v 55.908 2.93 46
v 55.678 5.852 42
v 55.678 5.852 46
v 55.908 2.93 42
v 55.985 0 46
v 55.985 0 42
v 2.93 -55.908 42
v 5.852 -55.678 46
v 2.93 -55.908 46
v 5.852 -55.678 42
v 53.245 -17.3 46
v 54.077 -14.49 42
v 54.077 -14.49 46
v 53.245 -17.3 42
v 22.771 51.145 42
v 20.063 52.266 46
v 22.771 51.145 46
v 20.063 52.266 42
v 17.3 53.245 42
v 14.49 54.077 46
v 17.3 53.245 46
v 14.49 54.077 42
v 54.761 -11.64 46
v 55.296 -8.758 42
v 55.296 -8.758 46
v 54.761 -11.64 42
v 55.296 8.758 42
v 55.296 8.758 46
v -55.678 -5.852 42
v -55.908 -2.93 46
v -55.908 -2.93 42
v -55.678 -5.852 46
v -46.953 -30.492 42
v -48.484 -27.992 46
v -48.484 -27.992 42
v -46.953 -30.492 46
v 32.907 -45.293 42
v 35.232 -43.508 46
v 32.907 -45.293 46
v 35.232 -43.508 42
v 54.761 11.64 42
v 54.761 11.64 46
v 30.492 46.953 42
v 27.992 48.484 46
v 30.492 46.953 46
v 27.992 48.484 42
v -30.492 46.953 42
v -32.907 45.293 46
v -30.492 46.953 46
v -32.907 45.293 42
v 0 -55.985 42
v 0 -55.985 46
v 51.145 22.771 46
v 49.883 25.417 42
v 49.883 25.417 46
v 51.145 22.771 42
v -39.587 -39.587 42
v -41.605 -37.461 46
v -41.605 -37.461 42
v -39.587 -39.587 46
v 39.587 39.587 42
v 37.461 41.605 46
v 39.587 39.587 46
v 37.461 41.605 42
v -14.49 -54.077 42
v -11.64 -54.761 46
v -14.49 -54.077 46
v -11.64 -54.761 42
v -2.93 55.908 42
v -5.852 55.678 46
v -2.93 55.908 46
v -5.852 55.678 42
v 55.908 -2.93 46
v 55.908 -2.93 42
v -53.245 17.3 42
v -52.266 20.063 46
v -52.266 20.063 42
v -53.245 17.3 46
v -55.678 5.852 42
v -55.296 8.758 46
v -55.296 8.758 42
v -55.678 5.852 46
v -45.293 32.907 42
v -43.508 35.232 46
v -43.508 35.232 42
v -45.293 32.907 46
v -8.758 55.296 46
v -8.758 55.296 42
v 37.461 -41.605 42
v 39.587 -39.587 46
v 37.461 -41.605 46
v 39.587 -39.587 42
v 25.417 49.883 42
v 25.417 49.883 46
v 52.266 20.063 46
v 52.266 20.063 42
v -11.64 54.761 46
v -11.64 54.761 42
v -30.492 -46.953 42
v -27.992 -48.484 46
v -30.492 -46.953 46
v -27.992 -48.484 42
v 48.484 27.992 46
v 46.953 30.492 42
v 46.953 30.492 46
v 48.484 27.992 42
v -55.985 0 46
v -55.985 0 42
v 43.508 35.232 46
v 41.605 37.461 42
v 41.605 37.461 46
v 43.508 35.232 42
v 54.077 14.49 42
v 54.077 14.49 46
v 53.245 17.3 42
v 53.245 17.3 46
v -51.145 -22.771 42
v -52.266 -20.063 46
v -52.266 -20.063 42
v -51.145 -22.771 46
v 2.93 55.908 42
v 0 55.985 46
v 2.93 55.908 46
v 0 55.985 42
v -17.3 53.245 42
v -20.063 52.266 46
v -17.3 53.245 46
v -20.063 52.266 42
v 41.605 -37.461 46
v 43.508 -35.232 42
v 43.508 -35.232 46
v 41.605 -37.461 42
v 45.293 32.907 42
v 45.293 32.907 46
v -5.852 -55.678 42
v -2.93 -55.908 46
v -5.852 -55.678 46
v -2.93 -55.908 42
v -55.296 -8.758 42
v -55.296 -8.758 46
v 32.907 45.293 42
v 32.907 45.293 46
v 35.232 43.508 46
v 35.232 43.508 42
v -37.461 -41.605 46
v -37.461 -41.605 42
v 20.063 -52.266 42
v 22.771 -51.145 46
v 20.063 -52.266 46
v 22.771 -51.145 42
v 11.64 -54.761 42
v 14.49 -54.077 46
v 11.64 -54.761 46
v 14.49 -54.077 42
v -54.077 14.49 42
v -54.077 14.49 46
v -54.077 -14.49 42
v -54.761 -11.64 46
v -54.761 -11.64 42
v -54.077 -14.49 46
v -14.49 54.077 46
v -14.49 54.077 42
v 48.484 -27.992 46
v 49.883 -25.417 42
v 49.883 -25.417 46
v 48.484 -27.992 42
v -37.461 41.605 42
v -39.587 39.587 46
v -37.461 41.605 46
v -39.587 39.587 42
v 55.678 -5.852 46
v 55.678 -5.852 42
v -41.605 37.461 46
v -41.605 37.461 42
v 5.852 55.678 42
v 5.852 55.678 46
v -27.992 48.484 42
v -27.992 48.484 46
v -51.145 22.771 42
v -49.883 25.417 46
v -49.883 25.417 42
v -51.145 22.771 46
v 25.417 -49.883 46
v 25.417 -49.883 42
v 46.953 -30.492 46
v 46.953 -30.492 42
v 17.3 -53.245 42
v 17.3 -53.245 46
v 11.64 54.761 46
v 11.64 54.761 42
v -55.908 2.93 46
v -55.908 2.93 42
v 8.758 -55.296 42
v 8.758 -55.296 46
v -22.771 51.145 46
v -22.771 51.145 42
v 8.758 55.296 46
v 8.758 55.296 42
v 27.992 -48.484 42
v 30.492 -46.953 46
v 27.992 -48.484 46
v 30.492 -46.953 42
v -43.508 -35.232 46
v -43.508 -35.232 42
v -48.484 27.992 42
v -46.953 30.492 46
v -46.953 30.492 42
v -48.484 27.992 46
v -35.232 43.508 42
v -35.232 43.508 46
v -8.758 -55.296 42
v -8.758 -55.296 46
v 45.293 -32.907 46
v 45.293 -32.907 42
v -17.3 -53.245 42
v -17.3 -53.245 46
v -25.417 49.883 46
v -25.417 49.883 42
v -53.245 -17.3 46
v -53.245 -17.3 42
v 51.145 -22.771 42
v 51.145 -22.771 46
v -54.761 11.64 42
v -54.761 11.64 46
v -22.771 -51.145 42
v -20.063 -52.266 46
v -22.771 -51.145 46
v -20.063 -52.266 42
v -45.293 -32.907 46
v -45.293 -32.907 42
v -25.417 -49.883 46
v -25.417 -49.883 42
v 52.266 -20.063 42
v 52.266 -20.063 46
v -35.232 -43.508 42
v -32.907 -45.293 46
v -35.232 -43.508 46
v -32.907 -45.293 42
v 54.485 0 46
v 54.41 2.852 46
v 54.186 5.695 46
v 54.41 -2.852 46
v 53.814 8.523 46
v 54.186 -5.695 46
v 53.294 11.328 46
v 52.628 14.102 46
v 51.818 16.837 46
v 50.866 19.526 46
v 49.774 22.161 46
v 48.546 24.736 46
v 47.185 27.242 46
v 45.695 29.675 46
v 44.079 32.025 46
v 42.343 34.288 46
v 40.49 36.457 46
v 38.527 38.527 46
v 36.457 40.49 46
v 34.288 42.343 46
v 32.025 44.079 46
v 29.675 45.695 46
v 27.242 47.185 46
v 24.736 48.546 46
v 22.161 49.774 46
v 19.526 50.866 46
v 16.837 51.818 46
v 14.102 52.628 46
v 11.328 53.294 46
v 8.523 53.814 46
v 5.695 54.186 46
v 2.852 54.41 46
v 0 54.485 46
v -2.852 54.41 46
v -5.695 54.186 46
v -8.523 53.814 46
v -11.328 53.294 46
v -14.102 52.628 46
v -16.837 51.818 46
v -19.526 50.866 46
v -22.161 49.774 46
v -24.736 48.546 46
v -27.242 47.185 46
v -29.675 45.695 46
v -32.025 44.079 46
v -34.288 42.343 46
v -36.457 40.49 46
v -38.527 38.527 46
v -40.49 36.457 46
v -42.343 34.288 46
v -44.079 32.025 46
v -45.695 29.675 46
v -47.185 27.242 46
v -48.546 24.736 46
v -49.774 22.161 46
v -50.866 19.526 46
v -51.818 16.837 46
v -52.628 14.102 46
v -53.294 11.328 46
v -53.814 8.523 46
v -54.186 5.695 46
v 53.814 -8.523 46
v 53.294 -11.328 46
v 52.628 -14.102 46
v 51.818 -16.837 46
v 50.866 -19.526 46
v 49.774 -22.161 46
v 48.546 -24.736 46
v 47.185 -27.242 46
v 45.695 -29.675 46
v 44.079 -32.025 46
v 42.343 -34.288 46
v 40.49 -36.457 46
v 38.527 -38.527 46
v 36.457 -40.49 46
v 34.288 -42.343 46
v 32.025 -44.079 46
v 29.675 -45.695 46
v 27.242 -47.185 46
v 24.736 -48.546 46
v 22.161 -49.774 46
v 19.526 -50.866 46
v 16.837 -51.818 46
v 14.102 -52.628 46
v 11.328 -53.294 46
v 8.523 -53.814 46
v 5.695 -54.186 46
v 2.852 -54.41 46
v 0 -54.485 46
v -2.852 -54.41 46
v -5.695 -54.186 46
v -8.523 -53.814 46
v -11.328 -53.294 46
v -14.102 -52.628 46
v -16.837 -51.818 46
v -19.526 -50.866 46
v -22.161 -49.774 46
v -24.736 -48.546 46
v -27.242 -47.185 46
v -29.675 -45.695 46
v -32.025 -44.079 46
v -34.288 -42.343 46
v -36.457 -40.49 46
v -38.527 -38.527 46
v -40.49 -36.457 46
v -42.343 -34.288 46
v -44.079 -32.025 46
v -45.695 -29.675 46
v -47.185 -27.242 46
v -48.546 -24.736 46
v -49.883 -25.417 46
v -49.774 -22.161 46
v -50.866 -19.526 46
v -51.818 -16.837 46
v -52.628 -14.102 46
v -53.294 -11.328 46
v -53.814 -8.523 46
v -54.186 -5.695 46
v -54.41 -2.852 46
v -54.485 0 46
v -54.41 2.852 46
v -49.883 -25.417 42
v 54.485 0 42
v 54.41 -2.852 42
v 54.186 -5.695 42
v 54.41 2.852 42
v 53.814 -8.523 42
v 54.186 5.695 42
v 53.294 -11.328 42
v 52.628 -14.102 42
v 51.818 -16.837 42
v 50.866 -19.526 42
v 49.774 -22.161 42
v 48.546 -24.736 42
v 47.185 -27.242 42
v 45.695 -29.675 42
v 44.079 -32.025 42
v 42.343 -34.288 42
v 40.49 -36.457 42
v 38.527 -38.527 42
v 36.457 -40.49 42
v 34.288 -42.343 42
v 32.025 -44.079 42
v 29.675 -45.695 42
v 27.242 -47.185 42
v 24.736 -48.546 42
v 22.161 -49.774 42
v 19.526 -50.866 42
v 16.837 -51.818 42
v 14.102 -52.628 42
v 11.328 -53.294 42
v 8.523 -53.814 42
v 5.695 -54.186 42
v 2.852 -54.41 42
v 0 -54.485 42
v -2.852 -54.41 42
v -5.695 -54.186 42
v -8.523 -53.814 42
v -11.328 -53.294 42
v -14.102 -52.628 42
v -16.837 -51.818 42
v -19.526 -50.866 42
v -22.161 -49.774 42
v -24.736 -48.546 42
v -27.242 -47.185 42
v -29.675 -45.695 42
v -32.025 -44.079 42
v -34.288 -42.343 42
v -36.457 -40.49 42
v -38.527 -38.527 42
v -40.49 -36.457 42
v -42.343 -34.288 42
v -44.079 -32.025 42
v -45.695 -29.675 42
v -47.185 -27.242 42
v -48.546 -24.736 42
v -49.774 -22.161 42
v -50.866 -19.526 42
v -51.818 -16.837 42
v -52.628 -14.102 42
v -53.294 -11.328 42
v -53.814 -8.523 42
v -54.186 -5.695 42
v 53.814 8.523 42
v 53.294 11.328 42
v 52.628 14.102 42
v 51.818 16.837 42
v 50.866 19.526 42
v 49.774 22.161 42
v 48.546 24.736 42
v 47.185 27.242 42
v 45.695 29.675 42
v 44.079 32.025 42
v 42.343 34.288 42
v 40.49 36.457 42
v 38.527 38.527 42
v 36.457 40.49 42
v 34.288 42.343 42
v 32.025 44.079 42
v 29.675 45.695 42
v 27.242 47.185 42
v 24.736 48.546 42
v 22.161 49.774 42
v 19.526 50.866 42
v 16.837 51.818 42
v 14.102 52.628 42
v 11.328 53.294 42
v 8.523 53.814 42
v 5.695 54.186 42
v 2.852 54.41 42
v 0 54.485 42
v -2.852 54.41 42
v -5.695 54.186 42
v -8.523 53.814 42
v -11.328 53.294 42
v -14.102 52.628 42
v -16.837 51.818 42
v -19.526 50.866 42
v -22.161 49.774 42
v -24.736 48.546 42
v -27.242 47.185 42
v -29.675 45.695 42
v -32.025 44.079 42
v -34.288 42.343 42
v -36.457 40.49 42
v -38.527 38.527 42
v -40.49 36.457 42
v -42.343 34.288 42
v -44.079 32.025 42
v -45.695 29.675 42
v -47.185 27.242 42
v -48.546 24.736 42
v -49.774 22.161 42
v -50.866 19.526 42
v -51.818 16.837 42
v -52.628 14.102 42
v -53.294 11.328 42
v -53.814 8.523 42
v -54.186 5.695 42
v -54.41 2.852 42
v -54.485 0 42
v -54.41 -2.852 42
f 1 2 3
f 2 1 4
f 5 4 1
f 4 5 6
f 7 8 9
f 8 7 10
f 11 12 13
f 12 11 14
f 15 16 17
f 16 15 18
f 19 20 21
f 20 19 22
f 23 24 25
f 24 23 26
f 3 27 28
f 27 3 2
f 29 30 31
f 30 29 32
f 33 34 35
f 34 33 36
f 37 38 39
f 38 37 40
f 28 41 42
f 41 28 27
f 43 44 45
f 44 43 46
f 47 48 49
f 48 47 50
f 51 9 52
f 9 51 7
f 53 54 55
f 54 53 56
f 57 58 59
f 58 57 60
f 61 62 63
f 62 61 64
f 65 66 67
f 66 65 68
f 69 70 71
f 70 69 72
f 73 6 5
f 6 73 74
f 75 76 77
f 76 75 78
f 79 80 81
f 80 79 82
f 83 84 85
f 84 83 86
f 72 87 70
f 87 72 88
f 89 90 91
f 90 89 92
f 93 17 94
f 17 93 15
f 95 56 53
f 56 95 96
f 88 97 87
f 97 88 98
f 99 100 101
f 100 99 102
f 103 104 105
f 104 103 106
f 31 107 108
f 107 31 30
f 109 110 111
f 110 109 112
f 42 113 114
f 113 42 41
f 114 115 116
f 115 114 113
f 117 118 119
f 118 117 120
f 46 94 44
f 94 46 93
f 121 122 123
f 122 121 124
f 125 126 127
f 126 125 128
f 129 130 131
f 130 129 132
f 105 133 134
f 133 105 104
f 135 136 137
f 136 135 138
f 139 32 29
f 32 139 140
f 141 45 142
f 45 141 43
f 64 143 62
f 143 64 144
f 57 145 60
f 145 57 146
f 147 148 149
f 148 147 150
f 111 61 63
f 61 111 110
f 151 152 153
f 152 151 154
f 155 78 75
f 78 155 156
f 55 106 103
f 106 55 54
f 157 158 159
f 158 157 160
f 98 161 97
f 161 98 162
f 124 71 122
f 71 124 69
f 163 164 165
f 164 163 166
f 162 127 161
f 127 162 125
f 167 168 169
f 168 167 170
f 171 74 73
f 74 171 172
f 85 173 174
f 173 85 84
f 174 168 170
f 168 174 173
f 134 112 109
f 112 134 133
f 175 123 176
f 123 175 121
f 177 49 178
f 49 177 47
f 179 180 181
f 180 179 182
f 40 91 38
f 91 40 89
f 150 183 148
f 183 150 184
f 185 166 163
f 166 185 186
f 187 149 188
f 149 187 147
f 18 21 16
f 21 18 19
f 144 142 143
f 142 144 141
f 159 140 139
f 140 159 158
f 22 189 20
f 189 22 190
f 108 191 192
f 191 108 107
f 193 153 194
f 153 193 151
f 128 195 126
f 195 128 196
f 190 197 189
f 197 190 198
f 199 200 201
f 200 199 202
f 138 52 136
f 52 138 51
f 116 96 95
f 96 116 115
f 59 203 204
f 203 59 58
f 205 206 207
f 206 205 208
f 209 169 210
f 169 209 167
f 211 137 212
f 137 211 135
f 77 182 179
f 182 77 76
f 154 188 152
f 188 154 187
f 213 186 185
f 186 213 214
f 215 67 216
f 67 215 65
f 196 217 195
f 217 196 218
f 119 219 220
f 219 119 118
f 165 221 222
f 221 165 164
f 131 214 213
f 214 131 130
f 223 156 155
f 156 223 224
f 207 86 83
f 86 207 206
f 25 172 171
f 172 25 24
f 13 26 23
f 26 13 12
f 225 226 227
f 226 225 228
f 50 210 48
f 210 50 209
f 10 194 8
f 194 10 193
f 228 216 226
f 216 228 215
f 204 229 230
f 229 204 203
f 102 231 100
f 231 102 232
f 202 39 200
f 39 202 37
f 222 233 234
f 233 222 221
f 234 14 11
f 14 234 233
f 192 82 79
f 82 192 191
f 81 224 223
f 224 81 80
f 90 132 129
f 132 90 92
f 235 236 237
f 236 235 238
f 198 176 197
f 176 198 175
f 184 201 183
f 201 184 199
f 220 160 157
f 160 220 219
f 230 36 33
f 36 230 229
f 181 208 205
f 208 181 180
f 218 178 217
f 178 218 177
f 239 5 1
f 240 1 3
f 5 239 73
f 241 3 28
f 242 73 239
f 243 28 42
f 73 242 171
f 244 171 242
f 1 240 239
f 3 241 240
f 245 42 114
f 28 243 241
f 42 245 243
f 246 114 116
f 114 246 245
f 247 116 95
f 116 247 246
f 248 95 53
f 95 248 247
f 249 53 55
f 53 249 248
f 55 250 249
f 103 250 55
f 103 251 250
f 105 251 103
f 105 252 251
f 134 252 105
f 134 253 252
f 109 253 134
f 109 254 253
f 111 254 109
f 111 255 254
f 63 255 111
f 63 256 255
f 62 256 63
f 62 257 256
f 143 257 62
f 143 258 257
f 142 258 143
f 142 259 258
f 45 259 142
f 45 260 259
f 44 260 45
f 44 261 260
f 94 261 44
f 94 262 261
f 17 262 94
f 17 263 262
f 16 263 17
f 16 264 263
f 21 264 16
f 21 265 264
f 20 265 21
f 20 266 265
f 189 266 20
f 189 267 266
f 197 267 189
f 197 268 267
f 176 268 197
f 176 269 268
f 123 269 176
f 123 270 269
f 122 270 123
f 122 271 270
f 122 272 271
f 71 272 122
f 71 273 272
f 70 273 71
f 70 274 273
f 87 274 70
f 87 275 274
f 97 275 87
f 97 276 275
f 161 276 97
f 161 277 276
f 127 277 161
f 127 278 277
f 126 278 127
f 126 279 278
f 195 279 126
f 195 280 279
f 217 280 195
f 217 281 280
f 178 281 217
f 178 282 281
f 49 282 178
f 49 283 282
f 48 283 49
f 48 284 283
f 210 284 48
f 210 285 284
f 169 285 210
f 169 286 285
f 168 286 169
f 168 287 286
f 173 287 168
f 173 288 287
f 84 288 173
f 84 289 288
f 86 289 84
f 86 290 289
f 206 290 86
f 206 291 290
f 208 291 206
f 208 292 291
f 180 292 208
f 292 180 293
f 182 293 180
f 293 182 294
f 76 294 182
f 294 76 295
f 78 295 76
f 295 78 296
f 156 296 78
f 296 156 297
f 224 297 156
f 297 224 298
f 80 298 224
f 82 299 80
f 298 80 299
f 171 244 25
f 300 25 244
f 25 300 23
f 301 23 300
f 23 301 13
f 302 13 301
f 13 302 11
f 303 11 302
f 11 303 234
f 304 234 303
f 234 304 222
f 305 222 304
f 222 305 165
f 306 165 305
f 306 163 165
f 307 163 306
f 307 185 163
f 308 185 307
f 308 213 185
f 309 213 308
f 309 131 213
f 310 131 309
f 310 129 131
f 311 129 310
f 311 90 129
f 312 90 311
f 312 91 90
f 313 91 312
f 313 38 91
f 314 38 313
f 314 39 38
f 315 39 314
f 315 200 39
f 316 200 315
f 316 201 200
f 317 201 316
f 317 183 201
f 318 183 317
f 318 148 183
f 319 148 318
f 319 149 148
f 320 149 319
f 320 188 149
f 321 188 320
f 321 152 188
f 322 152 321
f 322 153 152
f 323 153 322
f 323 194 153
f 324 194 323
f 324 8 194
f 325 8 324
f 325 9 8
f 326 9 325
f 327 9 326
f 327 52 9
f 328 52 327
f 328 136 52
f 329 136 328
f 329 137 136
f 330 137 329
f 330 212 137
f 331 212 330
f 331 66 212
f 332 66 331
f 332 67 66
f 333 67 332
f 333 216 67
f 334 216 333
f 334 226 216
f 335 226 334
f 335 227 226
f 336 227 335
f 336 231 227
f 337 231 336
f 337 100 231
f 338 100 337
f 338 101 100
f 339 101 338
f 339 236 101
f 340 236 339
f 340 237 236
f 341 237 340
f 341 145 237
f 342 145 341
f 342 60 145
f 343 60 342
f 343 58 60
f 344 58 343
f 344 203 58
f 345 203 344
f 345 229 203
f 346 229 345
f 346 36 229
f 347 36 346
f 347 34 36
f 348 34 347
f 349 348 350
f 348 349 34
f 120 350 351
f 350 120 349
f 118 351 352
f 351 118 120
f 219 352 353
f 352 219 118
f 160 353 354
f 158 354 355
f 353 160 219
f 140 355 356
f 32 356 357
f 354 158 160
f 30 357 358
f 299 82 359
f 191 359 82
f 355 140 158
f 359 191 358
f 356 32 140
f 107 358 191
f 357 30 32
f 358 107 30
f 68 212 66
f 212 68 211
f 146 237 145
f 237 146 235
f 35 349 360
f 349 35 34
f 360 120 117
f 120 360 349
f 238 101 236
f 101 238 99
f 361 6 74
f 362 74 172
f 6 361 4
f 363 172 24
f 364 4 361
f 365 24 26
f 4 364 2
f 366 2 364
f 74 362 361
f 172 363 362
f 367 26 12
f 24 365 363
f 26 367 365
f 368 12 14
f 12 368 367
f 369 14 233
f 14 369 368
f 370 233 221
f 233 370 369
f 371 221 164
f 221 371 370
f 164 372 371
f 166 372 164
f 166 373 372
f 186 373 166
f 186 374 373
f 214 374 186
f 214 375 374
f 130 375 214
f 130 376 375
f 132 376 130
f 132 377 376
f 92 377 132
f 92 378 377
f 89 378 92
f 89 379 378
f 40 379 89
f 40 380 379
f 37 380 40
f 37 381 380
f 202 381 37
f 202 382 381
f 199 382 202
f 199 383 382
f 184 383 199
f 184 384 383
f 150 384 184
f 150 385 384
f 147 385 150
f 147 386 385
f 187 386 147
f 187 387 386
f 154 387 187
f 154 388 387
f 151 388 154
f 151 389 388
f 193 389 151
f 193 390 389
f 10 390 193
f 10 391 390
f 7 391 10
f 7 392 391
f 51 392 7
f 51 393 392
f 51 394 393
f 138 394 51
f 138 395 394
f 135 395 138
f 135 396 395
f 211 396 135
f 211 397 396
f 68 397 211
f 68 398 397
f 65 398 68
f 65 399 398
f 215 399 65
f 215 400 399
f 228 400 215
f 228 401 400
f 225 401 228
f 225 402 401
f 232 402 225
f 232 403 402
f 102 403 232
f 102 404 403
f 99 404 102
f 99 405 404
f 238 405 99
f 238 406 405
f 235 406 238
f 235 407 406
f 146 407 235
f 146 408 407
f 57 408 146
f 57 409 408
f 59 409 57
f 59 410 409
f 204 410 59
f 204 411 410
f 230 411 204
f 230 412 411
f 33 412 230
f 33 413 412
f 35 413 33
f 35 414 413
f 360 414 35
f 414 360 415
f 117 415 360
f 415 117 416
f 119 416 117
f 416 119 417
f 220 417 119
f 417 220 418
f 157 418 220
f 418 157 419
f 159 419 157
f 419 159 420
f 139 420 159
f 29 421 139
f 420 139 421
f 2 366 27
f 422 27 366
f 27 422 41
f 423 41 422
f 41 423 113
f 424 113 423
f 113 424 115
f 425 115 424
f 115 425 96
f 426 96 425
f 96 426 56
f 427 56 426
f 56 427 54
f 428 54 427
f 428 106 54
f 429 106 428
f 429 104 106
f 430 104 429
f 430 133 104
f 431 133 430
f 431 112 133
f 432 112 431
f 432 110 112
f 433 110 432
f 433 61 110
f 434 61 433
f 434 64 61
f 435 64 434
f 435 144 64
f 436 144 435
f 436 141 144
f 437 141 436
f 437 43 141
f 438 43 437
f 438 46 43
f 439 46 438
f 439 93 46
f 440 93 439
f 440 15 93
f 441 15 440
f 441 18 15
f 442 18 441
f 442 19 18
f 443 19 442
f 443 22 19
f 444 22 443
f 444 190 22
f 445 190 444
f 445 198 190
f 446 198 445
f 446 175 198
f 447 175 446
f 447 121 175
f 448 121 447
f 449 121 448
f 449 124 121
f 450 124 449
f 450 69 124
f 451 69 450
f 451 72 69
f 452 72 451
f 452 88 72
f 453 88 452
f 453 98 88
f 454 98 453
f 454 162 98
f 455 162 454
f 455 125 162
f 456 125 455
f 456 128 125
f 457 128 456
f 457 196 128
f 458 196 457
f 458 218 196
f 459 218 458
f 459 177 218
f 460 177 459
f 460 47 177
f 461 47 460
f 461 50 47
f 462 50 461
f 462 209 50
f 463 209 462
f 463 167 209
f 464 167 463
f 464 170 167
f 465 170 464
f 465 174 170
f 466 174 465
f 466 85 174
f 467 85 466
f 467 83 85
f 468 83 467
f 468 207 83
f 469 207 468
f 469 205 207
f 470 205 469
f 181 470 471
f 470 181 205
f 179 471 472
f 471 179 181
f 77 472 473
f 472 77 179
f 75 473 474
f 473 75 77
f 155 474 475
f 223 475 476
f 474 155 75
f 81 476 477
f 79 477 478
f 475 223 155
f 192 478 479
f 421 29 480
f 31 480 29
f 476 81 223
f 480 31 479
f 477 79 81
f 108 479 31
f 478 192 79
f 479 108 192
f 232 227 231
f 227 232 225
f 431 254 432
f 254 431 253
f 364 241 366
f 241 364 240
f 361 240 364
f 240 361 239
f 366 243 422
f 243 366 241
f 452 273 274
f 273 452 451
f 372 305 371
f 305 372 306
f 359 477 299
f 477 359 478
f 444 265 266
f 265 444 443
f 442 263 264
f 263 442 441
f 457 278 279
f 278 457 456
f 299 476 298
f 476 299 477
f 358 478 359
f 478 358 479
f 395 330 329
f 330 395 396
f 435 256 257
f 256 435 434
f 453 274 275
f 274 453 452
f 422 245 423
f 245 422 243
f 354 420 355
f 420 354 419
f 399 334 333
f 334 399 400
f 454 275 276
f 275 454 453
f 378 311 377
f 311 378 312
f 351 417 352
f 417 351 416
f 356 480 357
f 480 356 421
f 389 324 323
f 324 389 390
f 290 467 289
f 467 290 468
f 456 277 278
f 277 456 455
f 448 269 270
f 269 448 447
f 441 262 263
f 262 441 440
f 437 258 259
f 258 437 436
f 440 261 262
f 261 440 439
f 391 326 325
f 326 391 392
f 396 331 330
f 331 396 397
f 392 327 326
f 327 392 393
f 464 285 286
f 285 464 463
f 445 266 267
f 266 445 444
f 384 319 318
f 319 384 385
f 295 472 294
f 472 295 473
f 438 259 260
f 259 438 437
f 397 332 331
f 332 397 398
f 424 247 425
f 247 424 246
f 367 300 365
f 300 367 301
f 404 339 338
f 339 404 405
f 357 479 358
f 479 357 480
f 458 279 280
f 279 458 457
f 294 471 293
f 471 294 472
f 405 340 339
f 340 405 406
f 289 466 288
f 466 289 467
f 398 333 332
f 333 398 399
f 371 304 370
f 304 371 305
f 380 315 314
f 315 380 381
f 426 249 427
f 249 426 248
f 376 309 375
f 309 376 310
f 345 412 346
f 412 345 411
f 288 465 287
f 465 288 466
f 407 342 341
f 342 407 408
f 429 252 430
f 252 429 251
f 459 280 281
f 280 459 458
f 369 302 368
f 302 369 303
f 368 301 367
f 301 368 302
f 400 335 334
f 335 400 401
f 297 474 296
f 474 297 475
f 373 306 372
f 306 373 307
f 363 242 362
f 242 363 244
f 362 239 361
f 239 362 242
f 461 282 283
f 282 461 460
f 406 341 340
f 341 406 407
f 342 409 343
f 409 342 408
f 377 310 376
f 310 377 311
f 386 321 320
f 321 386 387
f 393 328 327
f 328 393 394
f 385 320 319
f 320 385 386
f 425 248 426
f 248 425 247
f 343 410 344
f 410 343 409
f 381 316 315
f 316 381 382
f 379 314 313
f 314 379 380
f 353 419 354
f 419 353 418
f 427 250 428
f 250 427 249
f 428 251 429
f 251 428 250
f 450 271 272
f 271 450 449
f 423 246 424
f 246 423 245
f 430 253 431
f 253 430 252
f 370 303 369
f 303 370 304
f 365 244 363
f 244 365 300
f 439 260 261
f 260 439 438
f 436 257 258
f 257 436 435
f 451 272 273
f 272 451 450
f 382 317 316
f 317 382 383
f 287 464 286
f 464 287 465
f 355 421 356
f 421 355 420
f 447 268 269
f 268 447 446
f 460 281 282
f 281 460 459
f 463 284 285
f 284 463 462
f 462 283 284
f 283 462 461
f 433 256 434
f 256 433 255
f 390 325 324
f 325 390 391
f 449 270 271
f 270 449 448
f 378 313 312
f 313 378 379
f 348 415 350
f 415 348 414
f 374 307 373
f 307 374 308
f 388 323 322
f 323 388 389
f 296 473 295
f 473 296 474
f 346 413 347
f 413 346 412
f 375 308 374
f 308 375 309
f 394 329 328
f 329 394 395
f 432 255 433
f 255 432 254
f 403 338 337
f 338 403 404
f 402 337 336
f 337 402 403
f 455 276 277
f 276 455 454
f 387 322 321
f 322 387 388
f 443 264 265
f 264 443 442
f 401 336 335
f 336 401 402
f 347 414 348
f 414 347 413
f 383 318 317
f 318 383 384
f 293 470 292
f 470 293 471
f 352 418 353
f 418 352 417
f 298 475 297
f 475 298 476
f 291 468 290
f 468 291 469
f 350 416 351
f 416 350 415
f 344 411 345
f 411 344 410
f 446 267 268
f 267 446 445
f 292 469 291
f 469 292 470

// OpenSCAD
// file: orb_config.scad
// ============================================================
// Orb V9 — 全局参数（OpenSCAD 版本）
//
// V9 核心改进（对比 V8）：
//   1. 尺寸: Ø98mm → Ø112mm（桌面更有存在感）
//   2. 曲面: 连续椭球体 (x/56)²+(z/43)²=1，完全无拼接
//   3. 顶盖: 浮岛结构 Ø92mm × 6mm，0.6mm 缝隙呼吸口
//   4. 灯环: 隐藏式 4mm 磨砂扩散罩
//   5. 装配: 5 件式（卡扣 + M2×6 螺丝 ×4）
//
// 比例: H/W = 0.77（蛋形桌面情绪物件）
// ============================================================

// ─── 整机 ─────────────────────────────────────────────────
orb_diameter     = 112;
orb_height       = 86;
rx               = 56;           // 椭球 X 半径
ry               = 43;           // 椭球 Y（Z轴）半径
wall             = 2.2;

// ─── 分割 ─────────────────────────────────────────────────
split_z          = 44;           // 上下壳分割高度
ring_h           = 4;            // 灯环高度
ring_t           = 1.5;          // 灯环壁厚

// ─── 顶盖 ─────────────────────────────────────────────────
cap_d            = 92;           // 浮岛顶盖直径
cap_h            = 6;            // 顶盖厚度
cap_gap          = 0.6;          // 缝隙：麦克风孔 + 灯光溢出
cap_fillet       = 4;            // 顶盖圆角

// ─── 底盖 ─────────────────────────────────────────────────
base_d           = 62;           // 底面直径
base_h           = 3;            // 底盖厚度
base_fillet      = 8;            // 底部圆角

// ─── LED 灯环 ─────────────────────────────────────────────
led_count_main   = 16;           // 主灯环
led_count_halo   = 8;            // 底部 Halo
led_total        = led_count_main + led_count_halo;
led_slot_r       = 2.8;

// ─── 麦克风 ───────────────────────────────────────────────
mic_count        = 4;
mic_spacing      = 42;           // 麦克风间距
mic_hole_d       = 1;
mic_ring_r       = 21;           // 麦克风孔环半径

// ─── PCB ──────────────────────────────────────────────────
pcb_d            = 55;
pcb_thick        = 1.6;

// ─── 装配 ─────────────────────────────────────────────────
screw_d          = 2.2;          // M2 + 间隙
screw_boss_d     = 5;
n_screws         = 4;
screw_ring_r     = 24;

// ─── 渲染精度 ─────────────────────────────────────────────
$fn              = 120;

// ─── 椭球半径函数 ─────────────────────────────────────────
// 给定 z 高度（0..orb_height），返回该高度的截面半径
// 椭球中心在 z=ry，方程: (r/rx)² + ((z-ry)/ry)² = 1
function v9_r(z) =
    let(t = (z - ry) / ry)
    (abs(t) > 1) ? 0 : rx * sqrt(1 - t * t);
// main file
// ============================================================
// Orb V9 — LED 灯环扩散罩（LED_Ring）
// 隐藏式：4mm 高磨砂 PC 环，位于分割线处
// 材料：透明 PETG / 磨砂 PC
// ============================================================
include <orb_config.scad>

module led_ring() {
    z_bot = split_z - ring_h/2;
    r_outer = v9_r(split_z);  // 分割线处的椭球半径

    translate([0, 0, z_bot])
    difference() {
        cylinder(h=ring_h, r=r_outer);
        translate([0, 0, -0.1])
            cylinder(h=ring_h+0.2, r=r_outer - ring_t);
    }
}

led_ring();
